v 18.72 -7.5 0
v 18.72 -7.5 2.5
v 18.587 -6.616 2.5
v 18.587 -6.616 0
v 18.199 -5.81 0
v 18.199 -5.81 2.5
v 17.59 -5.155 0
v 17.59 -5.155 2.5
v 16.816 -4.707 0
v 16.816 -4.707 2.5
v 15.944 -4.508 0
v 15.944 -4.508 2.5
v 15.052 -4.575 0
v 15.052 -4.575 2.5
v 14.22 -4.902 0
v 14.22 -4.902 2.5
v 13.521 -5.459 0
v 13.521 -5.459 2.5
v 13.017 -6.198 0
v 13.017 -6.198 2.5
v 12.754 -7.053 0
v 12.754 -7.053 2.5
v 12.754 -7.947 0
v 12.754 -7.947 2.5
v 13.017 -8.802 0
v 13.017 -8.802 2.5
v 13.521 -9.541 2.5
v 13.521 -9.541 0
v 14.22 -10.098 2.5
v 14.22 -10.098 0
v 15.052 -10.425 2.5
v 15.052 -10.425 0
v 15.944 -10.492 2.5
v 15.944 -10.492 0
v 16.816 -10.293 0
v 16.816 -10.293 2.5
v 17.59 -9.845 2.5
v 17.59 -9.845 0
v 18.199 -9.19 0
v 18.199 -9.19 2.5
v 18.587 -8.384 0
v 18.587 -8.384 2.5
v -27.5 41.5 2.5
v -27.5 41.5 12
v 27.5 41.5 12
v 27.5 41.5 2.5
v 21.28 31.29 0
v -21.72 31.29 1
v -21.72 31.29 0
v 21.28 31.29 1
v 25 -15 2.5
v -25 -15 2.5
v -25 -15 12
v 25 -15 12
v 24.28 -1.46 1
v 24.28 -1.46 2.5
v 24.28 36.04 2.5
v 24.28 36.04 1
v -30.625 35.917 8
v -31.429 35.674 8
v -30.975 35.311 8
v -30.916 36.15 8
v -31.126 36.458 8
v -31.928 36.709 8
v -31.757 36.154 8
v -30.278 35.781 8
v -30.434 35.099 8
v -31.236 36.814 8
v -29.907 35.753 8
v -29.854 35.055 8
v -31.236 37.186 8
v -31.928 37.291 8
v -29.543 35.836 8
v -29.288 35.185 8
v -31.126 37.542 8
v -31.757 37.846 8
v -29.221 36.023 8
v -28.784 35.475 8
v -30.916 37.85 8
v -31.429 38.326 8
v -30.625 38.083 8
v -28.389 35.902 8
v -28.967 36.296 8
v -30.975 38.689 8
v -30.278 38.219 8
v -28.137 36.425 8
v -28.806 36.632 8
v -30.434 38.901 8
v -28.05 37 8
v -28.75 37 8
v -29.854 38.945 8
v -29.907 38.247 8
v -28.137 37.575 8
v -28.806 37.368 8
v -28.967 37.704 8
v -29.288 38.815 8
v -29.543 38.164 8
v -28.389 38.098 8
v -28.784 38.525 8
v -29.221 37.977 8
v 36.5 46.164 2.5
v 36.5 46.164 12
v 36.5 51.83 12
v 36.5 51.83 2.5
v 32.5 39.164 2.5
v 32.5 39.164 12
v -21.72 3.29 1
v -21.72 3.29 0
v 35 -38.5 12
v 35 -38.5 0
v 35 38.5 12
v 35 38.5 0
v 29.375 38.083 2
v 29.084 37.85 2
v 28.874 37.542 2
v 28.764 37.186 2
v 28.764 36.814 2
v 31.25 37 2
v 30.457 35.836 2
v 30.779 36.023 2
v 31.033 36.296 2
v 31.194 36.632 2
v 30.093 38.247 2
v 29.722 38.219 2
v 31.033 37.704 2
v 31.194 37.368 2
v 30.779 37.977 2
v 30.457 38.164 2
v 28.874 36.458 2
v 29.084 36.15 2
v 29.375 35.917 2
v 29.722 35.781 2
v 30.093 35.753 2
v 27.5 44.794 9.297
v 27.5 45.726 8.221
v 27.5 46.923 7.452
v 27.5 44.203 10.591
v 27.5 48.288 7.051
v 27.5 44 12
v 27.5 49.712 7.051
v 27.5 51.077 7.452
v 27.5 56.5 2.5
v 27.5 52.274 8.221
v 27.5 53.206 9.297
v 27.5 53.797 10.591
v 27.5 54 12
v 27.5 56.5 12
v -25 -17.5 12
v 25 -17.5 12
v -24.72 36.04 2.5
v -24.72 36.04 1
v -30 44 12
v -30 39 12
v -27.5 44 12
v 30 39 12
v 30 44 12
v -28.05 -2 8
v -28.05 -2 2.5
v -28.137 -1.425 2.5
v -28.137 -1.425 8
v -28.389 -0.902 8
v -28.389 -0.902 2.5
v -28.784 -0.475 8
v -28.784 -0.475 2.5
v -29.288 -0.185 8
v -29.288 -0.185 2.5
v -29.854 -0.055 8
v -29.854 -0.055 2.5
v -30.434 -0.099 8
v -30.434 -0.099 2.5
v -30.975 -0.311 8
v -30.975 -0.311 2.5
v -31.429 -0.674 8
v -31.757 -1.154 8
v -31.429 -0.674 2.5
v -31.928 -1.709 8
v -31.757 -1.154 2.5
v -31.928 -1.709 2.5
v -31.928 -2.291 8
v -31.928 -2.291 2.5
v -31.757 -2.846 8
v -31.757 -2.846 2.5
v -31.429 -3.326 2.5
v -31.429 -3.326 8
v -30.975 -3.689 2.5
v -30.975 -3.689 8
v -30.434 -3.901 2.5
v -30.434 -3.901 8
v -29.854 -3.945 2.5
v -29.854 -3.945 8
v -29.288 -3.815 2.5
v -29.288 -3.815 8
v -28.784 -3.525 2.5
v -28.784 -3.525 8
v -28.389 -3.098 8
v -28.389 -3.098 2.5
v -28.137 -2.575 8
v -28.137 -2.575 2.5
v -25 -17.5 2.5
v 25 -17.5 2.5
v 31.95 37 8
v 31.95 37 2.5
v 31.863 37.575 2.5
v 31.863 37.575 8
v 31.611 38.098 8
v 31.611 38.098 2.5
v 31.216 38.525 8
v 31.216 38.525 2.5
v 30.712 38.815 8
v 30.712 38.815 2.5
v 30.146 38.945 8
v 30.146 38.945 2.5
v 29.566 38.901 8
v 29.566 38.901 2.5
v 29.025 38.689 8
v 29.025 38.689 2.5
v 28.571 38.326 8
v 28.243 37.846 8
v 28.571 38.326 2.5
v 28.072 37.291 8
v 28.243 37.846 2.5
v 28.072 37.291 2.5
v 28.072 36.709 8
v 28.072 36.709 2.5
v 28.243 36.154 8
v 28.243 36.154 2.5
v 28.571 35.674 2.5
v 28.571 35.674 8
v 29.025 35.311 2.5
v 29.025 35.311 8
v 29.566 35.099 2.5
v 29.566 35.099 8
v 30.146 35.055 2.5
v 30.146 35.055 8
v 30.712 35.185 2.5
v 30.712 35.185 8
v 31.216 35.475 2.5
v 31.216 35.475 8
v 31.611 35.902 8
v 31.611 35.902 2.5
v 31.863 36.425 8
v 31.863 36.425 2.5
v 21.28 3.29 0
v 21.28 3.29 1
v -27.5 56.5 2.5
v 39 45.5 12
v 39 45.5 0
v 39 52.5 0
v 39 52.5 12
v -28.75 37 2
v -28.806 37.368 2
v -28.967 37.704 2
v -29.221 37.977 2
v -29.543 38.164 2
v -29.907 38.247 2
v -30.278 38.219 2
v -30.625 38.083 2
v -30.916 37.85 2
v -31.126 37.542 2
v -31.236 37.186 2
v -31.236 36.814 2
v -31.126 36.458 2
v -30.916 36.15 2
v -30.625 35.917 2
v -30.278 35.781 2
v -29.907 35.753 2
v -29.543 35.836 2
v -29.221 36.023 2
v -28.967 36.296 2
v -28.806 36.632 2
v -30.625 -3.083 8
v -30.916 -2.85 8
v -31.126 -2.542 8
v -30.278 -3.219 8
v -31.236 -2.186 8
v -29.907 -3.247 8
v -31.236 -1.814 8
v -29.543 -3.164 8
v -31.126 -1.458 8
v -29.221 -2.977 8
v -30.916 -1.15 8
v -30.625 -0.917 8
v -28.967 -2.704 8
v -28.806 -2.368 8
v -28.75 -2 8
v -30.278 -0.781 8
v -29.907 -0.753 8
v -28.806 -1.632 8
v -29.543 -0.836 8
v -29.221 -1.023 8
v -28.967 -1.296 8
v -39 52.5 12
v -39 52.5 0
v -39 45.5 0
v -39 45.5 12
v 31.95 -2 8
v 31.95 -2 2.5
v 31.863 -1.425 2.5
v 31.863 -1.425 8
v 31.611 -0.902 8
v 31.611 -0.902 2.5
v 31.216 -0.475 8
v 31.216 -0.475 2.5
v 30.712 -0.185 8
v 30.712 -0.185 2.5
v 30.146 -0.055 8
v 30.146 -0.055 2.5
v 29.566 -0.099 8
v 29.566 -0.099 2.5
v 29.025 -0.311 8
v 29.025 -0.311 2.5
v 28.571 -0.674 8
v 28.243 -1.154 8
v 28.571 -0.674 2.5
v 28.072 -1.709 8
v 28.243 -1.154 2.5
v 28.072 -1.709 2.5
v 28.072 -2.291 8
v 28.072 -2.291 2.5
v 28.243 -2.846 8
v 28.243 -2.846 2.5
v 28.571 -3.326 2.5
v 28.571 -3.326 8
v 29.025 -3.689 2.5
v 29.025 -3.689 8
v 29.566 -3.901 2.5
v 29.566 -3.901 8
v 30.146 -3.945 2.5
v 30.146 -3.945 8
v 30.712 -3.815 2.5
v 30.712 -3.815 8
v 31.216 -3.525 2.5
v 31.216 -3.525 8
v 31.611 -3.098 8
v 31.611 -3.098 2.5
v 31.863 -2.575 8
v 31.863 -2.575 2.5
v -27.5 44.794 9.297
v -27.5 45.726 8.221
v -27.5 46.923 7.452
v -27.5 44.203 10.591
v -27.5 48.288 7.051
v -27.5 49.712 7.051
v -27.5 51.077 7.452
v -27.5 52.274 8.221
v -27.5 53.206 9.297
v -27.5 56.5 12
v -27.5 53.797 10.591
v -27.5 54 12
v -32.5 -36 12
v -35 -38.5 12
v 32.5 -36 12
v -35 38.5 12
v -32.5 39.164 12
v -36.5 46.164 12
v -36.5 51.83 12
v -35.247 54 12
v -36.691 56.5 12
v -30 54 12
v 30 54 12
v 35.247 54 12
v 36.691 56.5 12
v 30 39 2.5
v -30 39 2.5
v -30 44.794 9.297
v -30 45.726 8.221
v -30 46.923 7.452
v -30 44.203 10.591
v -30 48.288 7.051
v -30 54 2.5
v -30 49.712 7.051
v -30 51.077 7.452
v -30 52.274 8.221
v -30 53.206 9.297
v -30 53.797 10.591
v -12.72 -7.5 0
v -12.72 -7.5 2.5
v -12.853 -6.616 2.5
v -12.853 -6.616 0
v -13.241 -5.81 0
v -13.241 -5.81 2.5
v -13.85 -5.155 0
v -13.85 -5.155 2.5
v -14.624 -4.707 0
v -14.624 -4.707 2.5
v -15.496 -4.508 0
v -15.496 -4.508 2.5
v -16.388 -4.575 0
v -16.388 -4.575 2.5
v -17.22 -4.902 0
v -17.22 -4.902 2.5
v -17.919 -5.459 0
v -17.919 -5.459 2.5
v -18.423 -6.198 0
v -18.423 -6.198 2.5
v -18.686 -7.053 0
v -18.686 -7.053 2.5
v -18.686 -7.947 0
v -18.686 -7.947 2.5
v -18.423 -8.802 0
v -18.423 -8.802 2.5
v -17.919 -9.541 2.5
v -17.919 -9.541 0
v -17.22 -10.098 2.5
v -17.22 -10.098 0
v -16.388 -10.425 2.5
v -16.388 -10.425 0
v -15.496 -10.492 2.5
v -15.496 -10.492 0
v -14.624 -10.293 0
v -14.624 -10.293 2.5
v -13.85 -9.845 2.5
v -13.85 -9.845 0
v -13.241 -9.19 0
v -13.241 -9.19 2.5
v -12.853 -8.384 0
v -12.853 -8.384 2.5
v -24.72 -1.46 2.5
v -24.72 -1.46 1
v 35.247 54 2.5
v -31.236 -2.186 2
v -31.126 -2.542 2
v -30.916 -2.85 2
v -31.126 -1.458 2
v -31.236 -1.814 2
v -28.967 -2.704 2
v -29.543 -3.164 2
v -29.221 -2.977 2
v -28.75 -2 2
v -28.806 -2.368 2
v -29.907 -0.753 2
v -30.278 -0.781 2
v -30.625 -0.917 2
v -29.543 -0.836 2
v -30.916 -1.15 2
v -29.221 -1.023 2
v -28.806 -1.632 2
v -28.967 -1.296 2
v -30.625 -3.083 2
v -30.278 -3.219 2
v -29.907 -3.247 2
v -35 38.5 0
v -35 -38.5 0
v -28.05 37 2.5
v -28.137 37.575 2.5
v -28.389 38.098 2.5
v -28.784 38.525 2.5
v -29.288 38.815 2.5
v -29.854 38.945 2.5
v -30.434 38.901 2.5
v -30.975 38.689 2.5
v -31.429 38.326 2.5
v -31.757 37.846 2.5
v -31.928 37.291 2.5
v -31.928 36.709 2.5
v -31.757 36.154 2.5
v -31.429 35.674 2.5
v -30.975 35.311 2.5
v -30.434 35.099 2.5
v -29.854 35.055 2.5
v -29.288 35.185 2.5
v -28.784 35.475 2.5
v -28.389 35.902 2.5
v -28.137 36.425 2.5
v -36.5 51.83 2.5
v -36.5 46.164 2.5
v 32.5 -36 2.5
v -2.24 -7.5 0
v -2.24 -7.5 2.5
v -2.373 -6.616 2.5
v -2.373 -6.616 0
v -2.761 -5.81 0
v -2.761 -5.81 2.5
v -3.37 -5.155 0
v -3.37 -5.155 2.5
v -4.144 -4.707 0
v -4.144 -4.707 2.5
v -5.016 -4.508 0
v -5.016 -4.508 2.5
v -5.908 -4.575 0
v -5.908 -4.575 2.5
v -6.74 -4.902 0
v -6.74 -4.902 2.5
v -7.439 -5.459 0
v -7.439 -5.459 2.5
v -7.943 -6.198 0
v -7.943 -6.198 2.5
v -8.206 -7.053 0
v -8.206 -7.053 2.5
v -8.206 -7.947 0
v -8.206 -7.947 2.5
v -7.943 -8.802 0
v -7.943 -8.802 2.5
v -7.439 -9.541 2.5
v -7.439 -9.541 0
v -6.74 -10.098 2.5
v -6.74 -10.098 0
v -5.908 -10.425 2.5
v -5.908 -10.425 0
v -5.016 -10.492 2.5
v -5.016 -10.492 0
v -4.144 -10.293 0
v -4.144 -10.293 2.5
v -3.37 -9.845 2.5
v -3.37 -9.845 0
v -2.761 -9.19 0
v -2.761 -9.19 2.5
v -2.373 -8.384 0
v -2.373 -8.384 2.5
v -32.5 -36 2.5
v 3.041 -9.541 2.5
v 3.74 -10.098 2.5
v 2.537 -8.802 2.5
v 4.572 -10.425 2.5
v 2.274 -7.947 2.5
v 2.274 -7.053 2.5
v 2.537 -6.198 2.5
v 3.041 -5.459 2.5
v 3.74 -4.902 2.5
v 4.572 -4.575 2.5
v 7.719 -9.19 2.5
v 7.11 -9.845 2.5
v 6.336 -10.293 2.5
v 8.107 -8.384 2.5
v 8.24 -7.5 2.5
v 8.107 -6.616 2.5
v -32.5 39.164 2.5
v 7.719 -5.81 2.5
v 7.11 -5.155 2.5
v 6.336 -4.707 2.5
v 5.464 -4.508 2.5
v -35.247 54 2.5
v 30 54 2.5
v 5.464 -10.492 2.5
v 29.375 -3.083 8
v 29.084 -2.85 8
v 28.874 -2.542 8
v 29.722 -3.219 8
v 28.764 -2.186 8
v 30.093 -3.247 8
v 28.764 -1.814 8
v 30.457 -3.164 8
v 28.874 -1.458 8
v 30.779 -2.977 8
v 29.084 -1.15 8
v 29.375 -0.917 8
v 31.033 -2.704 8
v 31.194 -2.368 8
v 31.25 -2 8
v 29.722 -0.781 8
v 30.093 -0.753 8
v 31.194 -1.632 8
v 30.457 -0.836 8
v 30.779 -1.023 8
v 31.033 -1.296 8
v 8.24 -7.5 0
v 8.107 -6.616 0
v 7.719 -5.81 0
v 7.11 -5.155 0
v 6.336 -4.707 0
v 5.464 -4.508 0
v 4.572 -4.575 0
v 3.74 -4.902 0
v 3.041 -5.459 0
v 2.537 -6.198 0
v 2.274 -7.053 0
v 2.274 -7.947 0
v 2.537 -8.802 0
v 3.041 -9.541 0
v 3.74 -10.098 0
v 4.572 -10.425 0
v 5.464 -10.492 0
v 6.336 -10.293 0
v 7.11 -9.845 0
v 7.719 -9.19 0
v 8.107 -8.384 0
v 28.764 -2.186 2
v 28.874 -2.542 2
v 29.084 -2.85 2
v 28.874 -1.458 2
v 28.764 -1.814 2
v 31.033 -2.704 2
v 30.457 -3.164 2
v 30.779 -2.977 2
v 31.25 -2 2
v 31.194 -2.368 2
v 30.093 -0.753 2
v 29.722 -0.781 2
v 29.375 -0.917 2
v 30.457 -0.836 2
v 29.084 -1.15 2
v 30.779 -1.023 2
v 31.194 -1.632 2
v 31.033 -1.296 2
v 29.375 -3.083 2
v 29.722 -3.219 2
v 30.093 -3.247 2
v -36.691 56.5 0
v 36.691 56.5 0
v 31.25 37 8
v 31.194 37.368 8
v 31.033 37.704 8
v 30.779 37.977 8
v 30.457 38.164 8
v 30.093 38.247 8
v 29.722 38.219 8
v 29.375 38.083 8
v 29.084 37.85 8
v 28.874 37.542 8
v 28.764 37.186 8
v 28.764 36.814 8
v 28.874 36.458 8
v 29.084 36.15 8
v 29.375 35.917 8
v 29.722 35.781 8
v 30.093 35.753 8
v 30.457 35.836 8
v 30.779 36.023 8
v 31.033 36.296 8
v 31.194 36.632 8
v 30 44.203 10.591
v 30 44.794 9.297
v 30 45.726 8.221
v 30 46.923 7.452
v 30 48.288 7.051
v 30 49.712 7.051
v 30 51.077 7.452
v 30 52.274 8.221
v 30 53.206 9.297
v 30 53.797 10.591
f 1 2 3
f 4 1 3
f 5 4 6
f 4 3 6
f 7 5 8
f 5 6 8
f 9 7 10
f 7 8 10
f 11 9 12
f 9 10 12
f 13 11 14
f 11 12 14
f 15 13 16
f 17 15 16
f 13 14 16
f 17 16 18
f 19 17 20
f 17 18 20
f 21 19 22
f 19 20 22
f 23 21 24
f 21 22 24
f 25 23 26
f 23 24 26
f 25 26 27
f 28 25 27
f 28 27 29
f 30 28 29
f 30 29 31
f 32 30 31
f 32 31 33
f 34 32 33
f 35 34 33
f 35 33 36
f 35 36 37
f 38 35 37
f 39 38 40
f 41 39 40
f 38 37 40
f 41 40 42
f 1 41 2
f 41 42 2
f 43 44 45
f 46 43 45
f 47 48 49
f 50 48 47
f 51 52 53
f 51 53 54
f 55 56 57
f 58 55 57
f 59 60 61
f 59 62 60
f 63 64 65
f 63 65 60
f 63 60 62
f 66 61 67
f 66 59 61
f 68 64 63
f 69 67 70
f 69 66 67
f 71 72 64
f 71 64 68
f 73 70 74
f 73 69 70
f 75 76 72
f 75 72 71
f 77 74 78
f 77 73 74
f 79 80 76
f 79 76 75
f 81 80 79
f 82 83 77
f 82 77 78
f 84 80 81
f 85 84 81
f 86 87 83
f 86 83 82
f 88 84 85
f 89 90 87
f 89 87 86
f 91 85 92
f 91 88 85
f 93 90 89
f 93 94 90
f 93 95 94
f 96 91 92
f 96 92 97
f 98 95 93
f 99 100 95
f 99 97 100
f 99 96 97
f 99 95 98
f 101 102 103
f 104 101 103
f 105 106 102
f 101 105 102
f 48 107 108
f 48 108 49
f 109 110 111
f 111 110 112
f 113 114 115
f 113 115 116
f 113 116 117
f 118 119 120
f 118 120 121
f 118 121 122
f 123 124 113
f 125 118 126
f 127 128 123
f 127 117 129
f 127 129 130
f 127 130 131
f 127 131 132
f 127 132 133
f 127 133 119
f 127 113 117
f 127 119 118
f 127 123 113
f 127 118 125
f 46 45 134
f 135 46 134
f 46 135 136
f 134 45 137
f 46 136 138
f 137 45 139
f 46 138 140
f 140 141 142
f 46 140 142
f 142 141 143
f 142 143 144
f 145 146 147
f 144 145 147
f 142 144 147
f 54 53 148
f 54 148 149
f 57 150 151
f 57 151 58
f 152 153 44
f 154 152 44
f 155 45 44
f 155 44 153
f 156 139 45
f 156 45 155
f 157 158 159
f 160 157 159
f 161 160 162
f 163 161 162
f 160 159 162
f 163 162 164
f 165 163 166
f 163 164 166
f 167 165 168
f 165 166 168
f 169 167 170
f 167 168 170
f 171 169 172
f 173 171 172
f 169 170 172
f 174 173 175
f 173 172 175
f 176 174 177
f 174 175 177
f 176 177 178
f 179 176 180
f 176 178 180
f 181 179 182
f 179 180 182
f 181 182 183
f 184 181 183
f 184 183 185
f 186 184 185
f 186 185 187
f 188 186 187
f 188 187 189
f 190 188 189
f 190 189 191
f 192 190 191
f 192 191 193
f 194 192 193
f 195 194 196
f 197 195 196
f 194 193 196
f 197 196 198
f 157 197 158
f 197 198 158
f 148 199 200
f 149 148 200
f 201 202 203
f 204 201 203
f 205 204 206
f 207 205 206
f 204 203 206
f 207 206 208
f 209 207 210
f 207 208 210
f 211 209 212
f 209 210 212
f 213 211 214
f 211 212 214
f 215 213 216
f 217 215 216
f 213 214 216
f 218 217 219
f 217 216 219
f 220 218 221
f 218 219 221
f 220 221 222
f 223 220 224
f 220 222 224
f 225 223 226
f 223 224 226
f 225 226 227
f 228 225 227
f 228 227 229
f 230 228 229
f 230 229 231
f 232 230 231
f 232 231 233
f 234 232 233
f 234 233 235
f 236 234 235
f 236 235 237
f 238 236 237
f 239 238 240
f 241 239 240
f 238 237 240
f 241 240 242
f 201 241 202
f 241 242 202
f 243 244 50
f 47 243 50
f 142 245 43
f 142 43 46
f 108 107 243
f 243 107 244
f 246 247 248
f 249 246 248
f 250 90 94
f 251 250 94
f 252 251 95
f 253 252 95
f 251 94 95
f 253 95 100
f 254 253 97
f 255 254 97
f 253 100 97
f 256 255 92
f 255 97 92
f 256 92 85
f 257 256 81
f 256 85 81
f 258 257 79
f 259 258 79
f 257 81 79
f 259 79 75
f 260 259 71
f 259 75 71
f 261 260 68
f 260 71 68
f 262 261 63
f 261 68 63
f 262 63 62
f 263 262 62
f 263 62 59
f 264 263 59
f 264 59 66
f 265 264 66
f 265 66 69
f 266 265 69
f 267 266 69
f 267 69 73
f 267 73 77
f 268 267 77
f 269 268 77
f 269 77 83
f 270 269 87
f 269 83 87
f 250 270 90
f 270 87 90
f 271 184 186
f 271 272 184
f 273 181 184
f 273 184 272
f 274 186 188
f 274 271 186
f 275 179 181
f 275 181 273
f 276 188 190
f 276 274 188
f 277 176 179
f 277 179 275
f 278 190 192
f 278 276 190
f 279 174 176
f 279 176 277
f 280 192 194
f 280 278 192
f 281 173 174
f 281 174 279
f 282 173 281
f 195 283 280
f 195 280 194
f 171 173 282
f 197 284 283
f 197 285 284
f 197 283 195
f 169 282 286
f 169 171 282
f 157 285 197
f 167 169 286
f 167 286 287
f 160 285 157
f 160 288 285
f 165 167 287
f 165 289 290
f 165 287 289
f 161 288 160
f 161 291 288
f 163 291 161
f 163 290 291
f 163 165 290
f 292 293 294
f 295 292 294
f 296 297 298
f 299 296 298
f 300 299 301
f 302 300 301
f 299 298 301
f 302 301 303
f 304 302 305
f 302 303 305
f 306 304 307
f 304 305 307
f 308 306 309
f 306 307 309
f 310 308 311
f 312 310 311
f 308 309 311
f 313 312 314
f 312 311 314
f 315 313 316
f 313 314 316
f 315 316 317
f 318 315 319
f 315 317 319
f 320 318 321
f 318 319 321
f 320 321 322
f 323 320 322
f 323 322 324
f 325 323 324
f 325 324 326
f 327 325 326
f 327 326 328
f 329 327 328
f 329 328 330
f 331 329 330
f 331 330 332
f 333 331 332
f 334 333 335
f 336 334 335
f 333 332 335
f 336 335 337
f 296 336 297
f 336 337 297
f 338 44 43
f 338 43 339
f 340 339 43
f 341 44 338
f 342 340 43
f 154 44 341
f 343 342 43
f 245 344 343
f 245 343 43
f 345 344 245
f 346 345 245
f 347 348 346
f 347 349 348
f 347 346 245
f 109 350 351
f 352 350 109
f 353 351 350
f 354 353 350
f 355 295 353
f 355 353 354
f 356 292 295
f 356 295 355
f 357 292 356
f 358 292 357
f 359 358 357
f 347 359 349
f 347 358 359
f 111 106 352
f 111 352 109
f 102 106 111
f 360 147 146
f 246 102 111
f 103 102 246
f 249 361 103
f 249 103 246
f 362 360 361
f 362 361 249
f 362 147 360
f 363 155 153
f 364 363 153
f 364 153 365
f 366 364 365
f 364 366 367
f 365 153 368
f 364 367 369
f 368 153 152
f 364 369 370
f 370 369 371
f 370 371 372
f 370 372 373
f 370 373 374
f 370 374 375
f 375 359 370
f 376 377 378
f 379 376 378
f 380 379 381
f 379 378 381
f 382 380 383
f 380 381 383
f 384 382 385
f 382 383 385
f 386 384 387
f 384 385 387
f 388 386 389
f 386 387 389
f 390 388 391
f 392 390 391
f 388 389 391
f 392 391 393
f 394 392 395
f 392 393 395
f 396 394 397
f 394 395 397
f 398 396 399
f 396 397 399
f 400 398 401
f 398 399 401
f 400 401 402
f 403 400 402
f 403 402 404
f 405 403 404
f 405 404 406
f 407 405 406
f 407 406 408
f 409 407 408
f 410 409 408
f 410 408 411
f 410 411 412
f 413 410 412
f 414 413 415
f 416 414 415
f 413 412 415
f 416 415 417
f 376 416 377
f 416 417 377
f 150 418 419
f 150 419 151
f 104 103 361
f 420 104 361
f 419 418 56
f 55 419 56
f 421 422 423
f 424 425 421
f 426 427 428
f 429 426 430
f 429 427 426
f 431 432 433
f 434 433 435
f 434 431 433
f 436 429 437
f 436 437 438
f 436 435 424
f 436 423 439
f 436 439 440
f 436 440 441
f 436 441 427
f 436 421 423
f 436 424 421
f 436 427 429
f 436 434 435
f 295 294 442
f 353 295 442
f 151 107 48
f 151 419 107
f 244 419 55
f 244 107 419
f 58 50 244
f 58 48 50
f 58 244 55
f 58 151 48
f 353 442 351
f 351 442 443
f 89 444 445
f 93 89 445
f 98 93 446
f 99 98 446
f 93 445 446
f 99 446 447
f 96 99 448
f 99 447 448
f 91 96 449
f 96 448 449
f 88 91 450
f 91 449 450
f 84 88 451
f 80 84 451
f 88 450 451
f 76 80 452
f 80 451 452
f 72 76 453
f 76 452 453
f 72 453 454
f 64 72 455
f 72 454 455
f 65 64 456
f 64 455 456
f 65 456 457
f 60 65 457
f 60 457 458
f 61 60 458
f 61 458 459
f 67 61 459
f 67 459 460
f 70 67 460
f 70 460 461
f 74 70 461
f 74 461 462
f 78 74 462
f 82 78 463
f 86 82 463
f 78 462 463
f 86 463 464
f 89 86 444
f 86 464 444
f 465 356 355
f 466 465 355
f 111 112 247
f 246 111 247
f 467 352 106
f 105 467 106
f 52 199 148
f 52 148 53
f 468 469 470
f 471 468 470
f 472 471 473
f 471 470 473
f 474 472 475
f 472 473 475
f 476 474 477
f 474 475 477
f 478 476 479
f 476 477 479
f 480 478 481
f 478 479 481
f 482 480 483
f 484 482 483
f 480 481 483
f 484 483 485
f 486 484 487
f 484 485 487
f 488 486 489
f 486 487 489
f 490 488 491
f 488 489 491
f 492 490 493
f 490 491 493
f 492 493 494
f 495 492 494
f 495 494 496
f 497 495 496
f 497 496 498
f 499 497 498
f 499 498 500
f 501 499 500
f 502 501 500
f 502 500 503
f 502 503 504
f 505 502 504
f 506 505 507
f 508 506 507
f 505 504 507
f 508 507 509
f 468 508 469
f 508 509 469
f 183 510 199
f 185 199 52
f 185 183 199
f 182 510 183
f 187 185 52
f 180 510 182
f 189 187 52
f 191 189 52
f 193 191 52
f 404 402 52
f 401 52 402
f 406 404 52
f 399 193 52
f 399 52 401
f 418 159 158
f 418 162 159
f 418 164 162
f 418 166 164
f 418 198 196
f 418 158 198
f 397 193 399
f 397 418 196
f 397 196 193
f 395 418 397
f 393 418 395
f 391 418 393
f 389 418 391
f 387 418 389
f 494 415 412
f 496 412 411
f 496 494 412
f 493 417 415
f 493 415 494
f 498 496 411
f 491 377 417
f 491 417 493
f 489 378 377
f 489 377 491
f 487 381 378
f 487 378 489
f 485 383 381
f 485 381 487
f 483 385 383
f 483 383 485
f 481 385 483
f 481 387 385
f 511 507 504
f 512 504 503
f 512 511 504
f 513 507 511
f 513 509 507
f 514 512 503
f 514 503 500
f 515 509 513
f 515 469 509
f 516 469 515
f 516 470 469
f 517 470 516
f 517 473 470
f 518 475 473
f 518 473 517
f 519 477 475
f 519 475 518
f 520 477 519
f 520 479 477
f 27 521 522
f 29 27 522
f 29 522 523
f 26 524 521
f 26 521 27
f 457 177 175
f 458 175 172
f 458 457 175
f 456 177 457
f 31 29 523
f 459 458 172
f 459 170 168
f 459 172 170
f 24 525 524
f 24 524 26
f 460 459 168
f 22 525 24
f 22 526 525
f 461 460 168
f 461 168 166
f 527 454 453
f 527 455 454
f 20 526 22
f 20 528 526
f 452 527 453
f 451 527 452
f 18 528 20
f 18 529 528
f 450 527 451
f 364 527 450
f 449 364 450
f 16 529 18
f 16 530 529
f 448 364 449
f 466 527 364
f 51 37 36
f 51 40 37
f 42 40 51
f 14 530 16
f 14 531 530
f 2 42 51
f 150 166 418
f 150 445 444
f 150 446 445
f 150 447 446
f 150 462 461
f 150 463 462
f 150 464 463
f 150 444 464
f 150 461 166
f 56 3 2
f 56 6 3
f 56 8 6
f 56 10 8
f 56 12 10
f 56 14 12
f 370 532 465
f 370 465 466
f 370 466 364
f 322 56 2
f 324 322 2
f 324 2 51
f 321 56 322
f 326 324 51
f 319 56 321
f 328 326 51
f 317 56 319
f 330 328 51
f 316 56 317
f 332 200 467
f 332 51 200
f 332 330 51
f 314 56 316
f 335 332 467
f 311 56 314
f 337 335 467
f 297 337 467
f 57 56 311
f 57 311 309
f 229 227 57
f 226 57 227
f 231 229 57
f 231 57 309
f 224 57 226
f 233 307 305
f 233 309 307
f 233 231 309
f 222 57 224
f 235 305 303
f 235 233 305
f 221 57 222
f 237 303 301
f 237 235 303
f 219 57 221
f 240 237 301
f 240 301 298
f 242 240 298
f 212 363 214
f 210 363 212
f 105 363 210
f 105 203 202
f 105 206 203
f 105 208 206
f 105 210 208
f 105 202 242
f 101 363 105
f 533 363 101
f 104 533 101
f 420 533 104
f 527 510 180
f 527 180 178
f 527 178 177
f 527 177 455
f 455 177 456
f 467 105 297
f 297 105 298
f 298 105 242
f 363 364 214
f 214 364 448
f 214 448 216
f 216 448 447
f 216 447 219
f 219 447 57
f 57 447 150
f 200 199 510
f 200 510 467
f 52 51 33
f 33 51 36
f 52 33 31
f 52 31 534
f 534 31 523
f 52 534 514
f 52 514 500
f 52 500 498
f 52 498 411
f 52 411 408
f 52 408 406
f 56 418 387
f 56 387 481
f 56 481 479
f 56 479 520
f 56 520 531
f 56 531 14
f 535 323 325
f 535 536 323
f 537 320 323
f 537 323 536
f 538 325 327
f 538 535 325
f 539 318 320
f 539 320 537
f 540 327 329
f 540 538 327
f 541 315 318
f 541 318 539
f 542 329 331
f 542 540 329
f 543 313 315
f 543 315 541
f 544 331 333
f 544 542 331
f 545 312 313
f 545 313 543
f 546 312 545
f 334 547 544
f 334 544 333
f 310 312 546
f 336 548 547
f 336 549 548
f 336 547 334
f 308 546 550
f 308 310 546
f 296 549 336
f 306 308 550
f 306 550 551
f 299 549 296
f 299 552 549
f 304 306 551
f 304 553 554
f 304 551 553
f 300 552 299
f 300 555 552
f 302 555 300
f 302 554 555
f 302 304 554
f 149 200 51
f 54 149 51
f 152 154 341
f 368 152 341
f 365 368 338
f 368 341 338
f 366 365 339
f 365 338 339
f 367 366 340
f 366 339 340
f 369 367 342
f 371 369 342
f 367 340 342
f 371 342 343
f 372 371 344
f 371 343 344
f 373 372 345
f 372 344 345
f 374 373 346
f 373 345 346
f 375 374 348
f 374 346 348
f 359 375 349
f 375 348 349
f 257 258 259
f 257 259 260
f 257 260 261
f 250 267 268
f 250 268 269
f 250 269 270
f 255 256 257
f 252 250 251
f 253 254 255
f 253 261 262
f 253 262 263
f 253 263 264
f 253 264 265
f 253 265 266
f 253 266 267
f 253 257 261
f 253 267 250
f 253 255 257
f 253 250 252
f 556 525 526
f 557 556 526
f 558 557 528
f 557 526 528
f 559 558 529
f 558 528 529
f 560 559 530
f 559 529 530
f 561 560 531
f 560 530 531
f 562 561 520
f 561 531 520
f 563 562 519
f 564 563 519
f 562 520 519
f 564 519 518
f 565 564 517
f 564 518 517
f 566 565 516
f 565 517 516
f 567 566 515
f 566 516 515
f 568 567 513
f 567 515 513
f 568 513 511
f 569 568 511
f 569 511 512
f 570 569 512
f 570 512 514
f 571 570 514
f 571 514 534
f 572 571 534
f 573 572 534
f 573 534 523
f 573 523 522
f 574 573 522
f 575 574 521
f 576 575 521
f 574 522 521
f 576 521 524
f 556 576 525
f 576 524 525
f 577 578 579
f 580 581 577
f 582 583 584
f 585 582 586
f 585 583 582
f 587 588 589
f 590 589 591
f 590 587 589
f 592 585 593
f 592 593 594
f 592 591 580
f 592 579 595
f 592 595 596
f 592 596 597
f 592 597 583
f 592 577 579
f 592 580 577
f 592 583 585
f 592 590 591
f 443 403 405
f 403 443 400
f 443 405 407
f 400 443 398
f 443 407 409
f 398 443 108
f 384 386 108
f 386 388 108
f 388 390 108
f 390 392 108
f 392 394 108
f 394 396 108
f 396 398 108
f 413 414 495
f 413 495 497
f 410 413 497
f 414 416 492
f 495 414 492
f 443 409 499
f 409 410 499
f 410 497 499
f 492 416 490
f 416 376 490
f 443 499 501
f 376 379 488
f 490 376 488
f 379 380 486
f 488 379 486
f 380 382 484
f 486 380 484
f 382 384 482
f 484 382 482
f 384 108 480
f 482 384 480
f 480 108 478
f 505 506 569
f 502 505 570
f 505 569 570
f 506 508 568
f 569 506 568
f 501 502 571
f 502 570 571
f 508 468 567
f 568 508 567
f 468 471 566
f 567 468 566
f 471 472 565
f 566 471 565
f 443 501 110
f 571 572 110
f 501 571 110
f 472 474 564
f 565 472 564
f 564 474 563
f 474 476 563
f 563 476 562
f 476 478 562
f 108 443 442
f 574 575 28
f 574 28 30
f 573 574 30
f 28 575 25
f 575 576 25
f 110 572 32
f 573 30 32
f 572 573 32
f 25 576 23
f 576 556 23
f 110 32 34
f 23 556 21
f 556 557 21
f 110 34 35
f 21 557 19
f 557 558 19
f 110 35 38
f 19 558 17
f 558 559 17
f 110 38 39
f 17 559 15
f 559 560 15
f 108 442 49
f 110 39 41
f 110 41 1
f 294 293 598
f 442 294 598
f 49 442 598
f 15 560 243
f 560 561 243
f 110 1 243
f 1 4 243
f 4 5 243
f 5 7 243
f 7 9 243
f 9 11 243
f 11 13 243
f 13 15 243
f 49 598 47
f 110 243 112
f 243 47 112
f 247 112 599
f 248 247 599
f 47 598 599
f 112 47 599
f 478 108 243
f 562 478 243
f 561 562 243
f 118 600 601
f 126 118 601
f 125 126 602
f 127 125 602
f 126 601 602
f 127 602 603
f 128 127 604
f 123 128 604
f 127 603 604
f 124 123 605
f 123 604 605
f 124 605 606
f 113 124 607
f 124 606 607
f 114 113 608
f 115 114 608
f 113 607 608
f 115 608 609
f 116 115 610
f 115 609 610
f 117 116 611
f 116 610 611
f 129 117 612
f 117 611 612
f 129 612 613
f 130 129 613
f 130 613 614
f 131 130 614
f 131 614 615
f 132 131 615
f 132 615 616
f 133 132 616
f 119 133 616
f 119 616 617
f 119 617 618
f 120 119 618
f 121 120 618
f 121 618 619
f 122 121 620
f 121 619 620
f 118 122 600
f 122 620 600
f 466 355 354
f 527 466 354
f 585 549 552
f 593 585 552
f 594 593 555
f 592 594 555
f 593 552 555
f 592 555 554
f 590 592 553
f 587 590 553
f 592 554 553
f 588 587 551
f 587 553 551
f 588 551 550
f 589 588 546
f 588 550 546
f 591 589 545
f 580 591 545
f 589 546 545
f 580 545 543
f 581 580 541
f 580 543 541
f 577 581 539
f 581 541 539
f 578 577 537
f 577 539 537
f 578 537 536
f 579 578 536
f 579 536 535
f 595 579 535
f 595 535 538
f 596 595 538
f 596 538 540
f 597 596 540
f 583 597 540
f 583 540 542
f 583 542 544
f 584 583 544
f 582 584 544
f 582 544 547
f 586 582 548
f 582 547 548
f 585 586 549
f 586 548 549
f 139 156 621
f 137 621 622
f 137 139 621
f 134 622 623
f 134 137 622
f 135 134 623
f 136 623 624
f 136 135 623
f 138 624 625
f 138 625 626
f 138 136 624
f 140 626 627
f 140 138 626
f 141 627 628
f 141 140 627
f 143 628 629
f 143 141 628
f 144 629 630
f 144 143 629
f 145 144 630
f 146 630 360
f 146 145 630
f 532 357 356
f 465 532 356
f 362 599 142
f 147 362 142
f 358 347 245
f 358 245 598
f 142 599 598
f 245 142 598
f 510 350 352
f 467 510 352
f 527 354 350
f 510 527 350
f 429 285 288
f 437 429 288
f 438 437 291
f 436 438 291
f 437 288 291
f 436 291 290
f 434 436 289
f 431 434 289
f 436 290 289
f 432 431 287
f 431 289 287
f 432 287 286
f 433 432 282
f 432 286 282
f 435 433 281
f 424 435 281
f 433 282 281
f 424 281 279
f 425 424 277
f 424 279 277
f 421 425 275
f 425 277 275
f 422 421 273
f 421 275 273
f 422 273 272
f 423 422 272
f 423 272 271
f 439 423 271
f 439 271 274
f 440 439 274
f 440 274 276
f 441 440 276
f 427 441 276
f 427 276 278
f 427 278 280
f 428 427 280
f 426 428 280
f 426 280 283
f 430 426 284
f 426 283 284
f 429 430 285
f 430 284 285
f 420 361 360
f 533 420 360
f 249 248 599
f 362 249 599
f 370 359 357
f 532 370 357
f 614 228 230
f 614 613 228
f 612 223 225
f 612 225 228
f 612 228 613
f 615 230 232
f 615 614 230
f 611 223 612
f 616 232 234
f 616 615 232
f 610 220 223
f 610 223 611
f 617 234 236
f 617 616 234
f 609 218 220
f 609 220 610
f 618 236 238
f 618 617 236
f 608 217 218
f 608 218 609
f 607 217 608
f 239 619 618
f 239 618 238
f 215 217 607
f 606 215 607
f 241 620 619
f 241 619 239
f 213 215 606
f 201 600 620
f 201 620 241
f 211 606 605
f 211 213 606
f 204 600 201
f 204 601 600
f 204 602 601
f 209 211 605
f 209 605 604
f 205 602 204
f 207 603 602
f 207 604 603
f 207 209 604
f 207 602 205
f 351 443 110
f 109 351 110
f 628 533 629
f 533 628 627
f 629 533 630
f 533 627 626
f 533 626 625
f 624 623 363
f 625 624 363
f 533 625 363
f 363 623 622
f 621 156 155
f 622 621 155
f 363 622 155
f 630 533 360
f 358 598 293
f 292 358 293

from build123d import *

# Parameters (mm, degrees)
F2_DEPTH      = 12
F3_W          = 55
F3_H          = 15
F4_DEPTH      = 9.5
F6_DEPTH      = 9.5
F7_R          = 5
F8_DEPTH      = 57.5
F8_DEPTH_BACK = 2.5
F9_W          = 50
F9_H          = 2.5
F10_DEPTH     = 9.5
F11_W         = 43
F11_H         = 28
F11_R         = 3
F12_DEPTH     = 2.5
F13_W         = 49
F13_H         = 37.5
F14_DEPTH     = 1.5
F15_R         = 1.95
F16_DEPTH     = 5.5
F17_R         = 1.25
F18_DEPTH     = 6


with BuildPart() as f2:
    # F1 (on Top) → F2 (new body)
    with BuildSketch(Plane.XY):
        Polygon((-35, 38.5), (-35, -38.5), (35, -38.5), (35, 38.5), (39, 45.5), (39, 52.5), (36.6905989232, 56.5), (-36.6905989232, 56.5), (-39, 52.5), (-39, 45.5), align=None)
    extrude(amount=F2_DEPTH)

    # F3 (on face) → F4 (cut)
    with BuildSketch(Plane.XY.offset(12)):
        with Locations((0, 49)):
            Rectangle(F3_W, F3_H)
    extrude(amount=-F4_DEPTH, mode=Mode.SUBTRACT)

    # F5 (on face) → F6 (cut)
    with BuildSketch(Plane.XY.offset(12)):
        Polygon((-32.5, 39.1639110927), (-32.5, -36), (32.5, -36), (32.5, 39.1639110927), (36.5, 46.1639110927), (36.5, 51.8301270189), (35.2472232503, 54), (30, 54), (30, 39), (-30, 39), (-30, 54), (-35.2472232503, 54), (-36.5, 51.8301270189), (-36.5, 46.1639110927), align=None)
    extrude(amount=-F6_DEPTH, mode=Mode.SUBTRACT)

    # F7 (on face) → F8 (cut, two sides)
    with BuildSketch(Plane.YZ.offset(-27.5)) as f8_sk:
        with Locations((49, 12)):
            Circle(F7_R)
    extrude(amount=F8_DEPTH, mode=Mode.SUBTRACT)
    extrude(f8_sk.sketch, amount=-F8_DEPTH_BACK, mode=Mode.SUBTRACT)

    # F9 (on face) → F10 (join)
    with BuildSketch(Plane.XY.offset(2.5)):
        with Locations((0, -16.25)):
            Rectangle(F9_W, F9_H)
    extrude(amount=F10_DEPTH)

    # F11 (on face) → F12 (cut, through all)
    with BuildSketch(Plane.XY.offset(2.5)):
        with Locations((-0.22, 17.29)):
            Rectangle(F11_W, F11_H)
        with Locations((-15.72, -7.5)):
            Circle(F11_R)
        with Locations((-5.24, -7.5)):
            Circle(F11_R)
        with Locations((5.24, -7.5)):
            Circle(F11_R)
        with Locations((15.72, -7.5)):
            Circle(F11_R)
    extrude(amount=-F12_DEPTH, mode=Mode.SUBTRACT)

    # F13 (on face) → F14 (cut)
    with BuildSketch(Plane.XY.offset(2.5)):
        with Locations((-0.22, 17.29)):
            Rectangle(F13_W, F13_H)
    extrude(amount=-F14_DEPTH, mode=Mode.SUBTRACT)

    # F15 (on face) → F16 (join)
    with BuildSketch(Plane.XY.offset(2.5)):
        with Locations((-30, 37)):
            Circle(F15_R)
        with Locations((30, 37)):
            Circle(F15_R)
        with Locations((-30, -2)):
            Circle(F15_R)
        with Locations((30, -2)):
            Circle(F15_R)
    extrude(amount=F16_DEPTH)

    # F17 (on face) → F18 (cut)
    with BuildSketch(Plane.XY.offset(8)):
        with Locations((-30, 37)):
            Circle(F17_R)
        with Locations((30, 37)):
            Circle(F17_R)
        with Locations((30, -2)):
            Circle(F17_R)
        with Locations((-30, -2)):
            Circle(F17_R)
    extrude(amount=-F18_DEPTH, mode=Mode.SUBTRACT)


solid = f2.part
